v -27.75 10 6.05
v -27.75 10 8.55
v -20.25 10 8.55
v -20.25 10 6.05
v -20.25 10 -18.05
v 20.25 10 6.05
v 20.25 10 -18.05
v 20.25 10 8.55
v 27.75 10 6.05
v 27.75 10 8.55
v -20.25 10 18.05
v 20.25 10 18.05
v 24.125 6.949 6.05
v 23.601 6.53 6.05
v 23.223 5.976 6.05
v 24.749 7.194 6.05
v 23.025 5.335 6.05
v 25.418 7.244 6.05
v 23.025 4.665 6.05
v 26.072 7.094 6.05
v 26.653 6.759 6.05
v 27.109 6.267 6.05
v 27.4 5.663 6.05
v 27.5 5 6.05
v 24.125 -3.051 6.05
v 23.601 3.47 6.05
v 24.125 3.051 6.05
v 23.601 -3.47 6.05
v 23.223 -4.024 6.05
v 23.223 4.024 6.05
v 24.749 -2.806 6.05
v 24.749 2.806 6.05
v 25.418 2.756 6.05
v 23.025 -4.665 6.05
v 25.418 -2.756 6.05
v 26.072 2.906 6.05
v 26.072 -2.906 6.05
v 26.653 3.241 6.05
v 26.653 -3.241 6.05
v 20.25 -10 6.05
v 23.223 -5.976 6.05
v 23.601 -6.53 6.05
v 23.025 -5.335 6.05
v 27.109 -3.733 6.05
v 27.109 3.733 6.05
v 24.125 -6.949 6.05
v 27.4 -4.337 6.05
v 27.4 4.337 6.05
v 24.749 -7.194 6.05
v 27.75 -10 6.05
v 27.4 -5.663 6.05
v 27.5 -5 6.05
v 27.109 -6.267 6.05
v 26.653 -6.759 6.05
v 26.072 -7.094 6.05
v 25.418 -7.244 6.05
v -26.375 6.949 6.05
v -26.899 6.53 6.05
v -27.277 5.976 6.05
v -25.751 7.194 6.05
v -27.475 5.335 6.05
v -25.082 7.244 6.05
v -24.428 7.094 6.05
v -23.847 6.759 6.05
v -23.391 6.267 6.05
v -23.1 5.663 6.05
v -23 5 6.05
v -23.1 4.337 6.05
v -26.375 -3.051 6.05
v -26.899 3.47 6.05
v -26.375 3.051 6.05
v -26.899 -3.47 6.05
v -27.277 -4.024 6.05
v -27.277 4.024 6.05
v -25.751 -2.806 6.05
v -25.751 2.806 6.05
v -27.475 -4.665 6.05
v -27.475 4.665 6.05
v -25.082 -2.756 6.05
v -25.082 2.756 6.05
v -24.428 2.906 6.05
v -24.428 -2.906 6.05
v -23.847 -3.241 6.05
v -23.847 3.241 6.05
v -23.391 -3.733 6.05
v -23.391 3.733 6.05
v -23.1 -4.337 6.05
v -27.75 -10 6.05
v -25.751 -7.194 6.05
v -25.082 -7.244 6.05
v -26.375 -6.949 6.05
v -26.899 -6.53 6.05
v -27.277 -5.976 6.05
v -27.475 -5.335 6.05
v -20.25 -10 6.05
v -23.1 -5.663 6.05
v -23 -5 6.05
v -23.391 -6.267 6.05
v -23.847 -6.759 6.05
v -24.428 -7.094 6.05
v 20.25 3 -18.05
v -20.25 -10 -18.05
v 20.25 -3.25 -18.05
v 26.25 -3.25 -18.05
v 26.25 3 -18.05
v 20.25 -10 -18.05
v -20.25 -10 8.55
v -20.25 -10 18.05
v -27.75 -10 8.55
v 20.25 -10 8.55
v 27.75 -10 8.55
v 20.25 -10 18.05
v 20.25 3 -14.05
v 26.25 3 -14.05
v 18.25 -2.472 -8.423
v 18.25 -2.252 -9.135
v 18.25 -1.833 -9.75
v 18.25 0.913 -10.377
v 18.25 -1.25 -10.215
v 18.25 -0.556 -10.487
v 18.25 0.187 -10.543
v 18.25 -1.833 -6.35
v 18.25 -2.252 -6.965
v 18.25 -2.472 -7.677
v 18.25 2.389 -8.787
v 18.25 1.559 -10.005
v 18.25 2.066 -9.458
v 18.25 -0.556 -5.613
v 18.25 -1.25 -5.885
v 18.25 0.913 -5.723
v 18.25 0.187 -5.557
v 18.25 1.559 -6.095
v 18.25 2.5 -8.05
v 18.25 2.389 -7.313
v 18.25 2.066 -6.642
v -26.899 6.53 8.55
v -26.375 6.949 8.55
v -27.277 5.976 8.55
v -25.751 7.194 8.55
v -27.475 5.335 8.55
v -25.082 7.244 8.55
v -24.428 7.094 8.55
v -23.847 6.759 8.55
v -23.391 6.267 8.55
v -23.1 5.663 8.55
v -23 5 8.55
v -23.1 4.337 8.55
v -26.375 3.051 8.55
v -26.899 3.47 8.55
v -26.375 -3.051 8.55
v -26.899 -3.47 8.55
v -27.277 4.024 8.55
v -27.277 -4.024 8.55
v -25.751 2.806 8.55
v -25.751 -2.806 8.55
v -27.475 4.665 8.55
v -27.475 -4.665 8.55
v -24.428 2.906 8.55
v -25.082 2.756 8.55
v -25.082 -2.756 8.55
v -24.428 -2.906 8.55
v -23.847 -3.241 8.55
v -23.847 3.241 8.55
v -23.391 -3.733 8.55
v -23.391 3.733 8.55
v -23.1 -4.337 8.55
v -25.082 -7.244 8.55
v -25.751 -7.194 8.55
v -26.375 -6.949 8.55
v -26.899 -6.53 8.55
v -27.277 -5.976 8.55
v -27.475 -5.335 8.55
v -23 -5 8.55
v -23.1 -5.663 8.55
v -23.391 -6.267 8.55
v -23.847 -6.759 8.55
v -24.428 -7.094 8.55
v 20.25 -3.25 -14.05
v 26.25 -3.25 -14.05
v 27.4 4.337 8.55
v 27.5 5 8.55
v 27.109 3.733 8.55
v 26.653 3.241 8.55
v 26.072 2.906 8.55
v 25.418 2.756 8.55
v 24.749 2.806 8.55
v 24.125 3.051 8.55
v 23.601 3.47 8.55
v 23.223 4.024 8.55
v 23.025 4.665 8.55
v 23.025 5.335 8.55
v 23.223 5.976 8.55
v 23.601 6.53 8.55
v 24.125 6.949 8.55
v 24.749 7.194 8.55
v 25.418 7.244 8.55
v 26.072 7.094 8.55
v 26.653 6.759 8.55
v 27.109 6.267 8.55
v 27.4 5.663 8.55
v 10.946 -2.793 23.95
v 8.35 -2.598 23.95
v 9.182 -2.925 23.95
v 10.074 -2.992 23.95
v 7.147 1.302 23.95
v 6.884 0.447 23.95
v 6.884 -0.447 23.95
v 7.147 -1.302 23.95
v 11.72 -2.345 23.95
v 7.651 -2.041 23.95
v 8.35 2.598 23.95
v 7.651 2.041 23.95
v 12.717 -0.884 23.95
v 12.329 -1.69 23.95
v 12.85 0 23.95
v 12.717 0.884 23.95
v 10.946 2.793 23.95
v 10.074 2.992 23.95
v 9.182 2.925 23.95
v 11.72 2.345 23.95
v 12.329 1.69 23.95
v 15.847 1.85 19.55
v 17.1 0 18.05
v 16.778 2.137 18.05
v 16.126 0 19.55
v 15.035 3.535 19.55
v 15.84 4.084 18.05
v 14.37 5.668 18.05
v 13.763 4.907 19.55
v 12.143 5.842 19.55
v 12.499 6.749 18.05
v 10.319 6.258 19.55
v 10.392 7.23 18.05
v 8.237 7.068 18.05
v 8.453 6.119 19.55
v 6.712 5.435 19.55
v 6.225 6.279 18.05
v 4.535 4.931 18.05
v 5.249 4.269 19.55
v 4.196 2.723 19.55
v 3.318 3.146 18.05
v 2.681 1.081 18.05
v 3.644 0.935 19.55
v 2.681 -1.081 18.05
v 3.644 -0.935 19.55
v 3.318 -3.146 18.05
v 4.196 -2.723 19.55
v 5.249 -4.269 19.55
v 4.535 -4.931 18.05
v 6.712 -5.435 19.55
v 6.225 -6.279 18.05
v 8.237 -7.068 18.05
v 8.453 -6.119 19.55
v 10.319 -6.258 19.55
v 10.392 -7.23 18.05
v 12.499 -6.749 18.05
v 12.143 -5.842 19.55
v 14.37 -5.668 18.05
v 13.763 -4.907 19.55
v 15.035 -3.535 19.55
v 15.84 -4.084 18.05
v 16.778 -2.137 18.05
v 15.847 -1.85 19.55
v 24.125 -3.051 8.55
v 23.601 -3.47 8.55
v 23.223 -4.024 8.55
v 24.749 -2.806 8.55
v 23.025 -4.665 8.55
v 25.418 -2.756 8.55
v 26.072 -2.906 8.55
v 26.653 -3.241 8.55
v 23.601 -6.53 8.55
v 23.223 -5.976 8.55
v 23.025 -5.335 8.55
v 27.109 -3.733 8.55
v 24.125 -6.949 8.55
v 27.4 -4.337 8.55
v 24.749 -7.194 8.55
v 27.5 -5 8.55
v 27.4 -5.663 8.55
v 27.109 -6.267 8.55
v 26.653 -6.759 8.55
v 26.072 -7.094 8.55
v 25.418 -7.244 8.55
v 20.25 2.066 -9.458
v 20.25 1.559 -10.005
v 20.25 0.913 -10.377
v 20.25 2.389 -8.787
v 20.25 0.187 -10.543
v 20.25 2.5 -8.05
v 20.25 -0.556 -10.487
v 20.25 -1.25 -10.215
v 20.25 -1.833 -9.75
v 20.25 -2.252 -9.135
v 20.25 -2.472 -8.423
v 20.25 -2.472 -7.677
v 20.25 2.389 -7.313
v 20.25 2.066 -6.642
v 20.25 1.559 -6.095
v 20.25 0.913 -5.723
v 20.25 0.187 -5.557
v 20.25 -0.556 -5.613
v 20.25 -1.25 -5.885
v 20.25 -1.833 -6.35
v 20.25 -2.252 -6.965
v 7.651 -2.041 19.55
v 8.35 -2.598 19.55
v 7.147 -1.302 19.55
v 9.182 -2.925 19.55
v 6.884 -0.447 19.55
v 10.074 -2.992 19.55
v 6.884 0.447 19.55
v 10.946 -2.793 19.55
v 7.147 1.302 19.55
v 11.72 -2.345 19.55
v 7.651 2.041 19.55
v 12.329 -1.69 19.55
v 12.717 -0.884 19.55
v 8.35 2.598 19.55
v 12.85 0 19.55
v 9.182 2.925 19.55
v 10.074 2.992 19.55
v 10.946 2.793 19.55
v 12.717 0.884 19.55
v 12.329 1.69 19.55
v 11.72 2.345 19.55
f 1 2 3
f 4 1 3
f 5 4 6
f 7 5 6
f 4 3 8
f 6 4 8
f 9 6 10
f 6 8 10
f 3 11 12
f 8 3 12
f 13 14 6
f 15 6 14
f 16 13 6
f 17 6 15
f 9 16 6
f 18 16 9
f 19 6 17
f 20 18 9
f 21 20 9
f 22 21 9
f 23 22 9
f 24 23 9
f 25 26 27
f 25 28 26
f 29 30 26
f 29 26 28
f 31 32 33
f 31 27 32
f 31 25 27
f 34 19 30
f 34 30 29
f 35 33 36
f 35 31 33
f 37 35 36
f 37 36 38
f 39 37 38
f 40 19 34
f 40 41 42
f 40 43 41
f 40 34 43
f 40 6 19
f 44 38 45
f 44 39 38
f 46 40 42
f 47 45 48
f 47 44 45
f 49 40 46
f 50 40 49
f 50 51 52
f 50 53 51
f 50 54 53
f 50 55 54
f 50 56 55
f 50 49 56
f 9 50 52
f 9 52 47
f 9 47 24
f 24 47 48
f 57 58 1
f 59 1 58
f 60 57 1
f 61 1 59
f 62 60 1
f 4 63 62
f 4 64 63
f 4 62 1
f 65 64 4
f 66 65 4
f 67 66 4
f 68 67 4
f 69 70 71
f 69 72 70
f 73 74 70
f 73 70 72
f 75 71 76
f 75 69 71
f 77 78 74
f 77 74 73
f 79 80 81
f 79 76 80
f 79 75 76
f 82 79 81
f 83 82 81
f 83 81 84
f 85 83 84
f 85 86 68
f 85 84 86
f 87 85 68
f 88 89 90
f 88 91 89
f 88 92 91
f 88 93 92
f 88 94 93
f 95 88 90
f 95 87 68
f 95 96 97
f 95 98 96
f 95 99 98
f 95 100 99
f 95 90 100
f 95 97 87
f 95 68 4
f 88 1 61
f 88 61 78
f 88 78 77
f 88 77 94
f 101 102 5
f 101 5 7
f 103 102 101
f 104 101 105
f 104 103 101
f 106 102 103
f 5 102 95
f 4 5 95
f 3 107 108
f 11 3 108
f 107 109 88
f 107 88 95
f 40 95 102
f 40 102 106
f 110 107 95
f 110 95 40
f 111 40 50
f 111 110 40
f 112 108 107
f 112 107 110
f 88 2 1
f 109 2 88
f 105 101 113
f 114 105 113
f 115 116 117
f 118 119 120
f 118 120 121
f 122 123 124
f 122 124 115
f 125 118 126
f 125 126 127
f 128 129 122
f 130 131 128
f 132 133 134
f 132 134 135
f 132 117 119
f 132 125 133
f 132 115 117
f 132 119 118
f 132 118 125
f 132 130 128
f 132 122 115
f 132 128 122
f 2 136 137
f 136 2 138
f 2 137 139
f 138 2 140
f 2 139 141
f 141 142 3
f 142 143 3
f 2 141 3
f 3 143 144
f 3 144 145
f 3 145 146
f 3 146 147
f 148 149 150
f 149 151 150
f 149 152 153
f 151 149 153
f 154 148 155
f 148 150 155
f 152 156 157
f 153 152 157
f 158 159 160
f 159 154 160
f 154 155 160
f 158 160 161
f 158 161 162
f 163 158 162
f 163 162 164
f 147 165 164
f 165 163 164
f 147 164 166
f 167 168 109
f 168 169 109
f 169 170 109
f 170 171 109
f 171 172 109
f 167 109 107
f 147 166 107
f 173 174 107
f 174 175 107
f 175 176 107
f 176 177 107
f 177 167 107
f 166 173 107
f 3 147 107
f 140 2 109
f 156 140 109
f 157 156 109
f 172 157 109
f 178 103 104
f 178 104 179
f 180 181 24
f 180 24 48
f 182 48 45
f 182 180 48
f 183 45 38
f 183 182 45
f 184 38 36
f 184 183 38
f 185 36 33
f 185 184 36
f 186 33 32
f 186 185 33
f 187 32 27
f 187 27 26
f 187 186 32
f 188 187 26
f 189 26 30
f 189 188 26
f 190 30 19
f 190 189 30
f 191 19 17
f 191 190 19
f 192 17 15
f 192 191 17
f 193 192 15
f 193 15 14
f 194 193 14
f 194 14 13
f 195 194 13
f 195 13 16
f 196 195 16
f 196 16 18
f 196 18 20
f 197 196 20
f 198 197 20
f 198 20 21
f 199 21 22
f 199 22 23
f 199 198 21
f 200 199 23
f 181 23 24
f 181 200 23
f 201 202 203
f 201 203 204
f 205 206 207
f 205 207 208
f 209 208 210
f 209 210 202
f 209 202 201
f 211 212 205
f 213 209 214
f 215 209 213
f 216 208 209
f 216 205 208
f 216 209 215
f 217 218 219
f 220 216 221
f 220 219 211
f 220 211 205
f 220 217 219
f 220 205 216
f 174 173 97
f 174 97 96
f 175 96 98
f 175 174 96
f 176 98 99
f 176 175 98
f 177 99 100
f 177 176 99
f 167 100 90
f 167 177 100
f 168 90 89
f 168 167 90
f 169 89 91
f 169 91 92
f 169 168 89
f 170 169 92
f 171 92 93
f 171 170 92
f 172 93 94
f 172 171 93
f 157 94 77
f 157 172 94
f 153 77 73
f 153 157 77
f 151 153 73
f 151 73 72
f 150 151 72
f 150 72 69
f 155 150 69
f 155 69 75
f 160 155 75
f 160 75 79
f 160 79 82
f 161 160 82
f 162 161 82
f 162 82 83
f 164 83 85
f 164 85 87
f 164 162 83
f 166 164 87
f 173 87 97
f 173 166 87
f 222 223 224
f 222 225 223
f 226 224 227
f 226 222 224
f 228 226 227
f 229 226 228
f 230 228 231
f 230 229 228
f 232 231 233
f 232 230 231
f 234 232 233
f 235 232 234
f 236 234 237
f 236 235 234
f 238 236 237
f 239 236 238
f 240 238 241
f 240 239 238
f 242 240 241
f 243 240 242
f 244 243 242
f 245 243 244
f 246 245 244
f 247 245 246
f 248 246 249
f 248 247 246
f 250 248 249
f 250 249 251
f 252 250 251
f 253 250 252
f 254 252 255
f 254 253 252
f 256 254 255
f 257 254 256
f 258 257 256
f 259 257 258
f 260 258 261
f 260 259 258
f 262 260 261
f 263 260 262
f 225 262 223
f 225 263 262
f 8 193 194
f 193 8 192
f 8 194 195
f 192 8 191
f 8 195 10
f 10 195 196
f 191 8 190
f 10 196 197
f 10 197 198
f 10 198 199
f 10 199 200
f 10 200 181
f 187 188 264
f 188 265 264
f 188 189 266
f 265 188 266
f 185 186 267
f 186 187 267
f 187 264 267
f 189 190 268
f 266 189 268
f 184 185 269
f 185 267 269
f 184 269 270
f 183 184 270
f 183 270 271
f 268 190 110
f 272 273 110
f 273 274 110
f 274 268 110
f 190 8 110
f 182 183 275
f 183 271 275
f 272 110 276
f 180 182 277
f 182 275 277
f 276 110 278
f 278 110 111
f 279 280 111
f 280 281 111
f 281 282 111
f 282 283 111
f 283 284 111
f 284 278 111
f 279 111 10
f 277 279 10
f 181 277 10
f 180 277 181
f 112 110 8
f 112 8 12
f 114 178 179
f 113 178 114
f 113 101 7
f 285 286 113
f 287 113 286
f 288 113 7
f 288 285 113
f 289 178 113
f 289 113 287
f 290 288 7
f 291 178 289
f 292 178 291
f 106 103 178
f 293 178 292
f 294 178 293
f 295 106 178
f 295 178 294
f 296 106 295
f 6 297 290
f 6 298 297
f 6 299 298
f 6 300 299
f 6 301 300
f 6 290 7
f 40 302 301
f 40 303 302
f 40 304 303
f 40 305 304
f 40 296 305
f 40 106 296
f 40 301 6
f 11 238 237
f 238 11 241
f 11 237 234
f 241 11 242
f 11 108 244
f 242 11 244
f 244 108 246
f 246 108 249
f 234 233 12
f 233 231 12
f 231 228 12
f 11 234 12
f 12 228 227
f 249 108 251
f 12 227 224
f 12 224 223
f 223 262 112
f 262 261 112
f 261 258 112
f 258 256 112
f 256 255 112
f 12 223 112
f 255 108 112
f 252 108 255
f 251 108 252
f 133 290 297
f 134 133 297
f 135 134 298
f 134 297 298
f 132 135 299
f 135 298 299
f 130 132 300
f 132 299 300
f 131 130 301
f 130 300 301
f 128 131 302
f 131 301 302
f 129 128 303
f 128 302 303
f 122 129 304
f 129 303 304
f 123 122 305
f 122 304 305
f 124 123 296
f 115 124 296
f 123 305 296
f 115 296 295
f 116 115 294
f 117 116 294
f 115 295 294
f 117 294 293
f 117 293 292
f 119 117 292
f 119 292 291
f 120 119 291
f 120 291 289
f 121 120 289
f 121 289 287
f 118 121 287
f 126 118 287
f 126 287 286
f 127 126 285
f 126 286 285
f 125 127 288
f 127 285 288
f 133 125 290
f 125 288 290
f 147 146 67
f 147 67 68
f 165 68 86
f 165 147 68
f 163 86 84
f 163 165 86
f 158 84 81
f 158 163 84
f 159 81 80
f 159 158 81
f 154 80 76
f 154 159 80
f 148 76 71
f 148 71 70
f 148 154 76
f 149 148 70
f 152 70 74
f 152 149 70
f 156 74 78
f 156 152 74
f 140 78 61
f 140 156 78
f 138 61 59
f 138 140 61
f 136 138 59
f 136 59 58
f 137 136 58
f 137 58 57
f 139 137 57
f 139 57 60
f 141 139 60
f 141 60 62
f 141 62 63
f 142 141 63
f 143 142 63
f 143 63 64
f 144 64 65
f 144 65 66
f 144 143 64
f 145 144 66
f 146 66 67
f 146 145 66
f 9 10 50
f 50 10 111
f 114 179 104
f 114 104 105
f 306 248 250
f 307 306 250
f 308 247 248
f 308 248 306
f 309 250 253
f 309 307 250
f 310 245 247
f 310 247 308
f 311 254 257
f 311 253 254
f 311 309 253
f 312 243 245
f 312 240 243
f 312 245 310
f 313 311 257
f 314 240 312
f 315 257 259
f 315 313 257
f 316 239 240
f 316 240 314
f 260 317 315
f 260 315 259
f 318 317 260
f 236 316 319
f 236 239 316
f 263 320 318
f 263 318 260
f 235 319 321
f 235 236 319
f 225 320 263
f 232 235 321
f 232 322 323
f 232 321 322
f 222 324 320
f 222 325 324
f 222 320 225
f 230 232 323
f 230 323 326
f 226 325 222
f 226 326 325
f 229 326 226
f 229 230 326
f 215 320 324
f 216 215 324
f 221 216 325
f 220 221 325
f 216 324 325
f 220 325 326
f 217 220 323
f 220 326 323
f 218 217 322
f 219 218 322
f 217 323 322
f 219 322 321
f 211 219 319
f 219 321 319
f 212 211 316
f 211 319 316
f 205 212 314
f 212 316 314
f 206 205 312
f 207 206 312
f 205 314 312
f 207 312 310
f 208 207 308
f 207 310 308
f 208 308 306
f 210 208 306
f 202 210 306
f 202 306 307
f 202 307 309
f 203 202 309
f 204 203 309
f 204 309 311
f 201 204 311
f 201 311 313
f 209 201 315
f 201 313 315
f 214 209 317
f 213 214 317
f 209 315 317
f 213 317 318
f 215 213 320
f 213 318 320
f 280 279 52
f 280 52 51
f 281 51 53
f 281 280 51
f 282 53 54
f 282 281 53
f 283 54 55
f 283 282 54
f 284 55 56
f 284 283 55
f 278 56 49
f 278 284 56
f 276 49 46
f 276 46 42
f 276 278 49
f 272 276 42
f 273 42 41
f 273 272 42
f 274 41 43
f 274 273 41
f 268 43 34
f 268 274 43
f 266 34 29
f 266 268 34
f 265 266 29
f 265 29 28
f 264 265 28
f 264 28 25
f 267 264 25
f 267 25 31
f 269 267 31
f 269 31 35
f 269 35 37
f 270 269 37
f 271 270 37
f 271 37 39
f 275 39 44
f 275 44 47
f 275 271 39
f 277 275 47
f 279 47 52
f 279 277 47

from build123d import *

# Parameters (mm, degrees)
F0_W      = 40.5
F0_H      = 36.1
F1_DEPTH  = 10
F3_W      = 7.5
F3_H      = 20
F3_R      = 2.25
F4_DEPTH  = 2.5
F5_R      = 7.25
F6_DEPTH  = 1.5
F6_TAPER  = 33
F8_R      = 3
F9_DEPTH  = 4.4
F10_R     = 2.5
F11_DEPTH = 2
F12_W     = 6.25
F12_H     = 4
F13_DEPTH = 6


# Not quite as in the source:
# - a feature names something its author has since deleted; it is built from what else it names


with BuildPart() as f1:
    # F0 (on Front) → F1 (new body, symmetric)
    with BuildSketch(Plane.XZ):
        Rectangle(F0_W, F0_H)
    extrude(amount=F1_DEPTH, both=True)

    # F3 (on offset) → F4 (join)
    with BuildSketch(Plane(origin=(0, 0, 8.55), x_dir=(1, 0, 0), z_dir=(0, 0, -1))):
        with Locations((-24, 0)):
            Rectangle(F3_W, F3_H)
        with Locations((-25.25, -5)):
            Circle(F3_R, mode=Mode.SUBTRACT)
        with Locations((-25.25, 5)):
            Circle(F3_R, mode=Mode.SUBTRACT)
        with Locations((24, 0)):
            Rectangle(F3_W, F3_H)
        with Locations((25.25, -5)):
            Circle(F3_R, mode=Mode.SUBTRACT)
        with Locations((25.25, 5)):
            Circle(F3_R, mode=Mode.SUBTRACT)
    extrude(amount=F4_DEPTH)

    # F5 (on face) → F6 (join)
    with BuildSketch(Plane.XY.offset(18.05)):
        with Locations((9.85, 0)):
            Circle(F5_R)
    extrude(amount=F6_DEPTH, taper=F6_TAPER)

    # F8 (on face) → F9 (join, through all)
    with BuildSketch(Plane.XY.offset(19.55)):
        with Locations((9.85, 0)):
            Circle(F8_R)
    extrude(amount=F9_DEPTH)

    # F10 (on face) → F11 (cut)
    with BuildSketch(Plane.YZ.offset(20.25)):
        with Locations((0, -8.05)):
            Circle(F10_R)
    extrude(amount=-F11_DEPTH, mode=Mode.SUBTRACT)

    # F12 (on face) → F13 (join)
    with BuildSketch(Plane.YZ.offset(20.25)):
        with Locations((-0.125, -16.05)):
            Rectangle(F12_W, F12_H)
    extrude(amount=F13_DEPTH)


solid = f1.part
